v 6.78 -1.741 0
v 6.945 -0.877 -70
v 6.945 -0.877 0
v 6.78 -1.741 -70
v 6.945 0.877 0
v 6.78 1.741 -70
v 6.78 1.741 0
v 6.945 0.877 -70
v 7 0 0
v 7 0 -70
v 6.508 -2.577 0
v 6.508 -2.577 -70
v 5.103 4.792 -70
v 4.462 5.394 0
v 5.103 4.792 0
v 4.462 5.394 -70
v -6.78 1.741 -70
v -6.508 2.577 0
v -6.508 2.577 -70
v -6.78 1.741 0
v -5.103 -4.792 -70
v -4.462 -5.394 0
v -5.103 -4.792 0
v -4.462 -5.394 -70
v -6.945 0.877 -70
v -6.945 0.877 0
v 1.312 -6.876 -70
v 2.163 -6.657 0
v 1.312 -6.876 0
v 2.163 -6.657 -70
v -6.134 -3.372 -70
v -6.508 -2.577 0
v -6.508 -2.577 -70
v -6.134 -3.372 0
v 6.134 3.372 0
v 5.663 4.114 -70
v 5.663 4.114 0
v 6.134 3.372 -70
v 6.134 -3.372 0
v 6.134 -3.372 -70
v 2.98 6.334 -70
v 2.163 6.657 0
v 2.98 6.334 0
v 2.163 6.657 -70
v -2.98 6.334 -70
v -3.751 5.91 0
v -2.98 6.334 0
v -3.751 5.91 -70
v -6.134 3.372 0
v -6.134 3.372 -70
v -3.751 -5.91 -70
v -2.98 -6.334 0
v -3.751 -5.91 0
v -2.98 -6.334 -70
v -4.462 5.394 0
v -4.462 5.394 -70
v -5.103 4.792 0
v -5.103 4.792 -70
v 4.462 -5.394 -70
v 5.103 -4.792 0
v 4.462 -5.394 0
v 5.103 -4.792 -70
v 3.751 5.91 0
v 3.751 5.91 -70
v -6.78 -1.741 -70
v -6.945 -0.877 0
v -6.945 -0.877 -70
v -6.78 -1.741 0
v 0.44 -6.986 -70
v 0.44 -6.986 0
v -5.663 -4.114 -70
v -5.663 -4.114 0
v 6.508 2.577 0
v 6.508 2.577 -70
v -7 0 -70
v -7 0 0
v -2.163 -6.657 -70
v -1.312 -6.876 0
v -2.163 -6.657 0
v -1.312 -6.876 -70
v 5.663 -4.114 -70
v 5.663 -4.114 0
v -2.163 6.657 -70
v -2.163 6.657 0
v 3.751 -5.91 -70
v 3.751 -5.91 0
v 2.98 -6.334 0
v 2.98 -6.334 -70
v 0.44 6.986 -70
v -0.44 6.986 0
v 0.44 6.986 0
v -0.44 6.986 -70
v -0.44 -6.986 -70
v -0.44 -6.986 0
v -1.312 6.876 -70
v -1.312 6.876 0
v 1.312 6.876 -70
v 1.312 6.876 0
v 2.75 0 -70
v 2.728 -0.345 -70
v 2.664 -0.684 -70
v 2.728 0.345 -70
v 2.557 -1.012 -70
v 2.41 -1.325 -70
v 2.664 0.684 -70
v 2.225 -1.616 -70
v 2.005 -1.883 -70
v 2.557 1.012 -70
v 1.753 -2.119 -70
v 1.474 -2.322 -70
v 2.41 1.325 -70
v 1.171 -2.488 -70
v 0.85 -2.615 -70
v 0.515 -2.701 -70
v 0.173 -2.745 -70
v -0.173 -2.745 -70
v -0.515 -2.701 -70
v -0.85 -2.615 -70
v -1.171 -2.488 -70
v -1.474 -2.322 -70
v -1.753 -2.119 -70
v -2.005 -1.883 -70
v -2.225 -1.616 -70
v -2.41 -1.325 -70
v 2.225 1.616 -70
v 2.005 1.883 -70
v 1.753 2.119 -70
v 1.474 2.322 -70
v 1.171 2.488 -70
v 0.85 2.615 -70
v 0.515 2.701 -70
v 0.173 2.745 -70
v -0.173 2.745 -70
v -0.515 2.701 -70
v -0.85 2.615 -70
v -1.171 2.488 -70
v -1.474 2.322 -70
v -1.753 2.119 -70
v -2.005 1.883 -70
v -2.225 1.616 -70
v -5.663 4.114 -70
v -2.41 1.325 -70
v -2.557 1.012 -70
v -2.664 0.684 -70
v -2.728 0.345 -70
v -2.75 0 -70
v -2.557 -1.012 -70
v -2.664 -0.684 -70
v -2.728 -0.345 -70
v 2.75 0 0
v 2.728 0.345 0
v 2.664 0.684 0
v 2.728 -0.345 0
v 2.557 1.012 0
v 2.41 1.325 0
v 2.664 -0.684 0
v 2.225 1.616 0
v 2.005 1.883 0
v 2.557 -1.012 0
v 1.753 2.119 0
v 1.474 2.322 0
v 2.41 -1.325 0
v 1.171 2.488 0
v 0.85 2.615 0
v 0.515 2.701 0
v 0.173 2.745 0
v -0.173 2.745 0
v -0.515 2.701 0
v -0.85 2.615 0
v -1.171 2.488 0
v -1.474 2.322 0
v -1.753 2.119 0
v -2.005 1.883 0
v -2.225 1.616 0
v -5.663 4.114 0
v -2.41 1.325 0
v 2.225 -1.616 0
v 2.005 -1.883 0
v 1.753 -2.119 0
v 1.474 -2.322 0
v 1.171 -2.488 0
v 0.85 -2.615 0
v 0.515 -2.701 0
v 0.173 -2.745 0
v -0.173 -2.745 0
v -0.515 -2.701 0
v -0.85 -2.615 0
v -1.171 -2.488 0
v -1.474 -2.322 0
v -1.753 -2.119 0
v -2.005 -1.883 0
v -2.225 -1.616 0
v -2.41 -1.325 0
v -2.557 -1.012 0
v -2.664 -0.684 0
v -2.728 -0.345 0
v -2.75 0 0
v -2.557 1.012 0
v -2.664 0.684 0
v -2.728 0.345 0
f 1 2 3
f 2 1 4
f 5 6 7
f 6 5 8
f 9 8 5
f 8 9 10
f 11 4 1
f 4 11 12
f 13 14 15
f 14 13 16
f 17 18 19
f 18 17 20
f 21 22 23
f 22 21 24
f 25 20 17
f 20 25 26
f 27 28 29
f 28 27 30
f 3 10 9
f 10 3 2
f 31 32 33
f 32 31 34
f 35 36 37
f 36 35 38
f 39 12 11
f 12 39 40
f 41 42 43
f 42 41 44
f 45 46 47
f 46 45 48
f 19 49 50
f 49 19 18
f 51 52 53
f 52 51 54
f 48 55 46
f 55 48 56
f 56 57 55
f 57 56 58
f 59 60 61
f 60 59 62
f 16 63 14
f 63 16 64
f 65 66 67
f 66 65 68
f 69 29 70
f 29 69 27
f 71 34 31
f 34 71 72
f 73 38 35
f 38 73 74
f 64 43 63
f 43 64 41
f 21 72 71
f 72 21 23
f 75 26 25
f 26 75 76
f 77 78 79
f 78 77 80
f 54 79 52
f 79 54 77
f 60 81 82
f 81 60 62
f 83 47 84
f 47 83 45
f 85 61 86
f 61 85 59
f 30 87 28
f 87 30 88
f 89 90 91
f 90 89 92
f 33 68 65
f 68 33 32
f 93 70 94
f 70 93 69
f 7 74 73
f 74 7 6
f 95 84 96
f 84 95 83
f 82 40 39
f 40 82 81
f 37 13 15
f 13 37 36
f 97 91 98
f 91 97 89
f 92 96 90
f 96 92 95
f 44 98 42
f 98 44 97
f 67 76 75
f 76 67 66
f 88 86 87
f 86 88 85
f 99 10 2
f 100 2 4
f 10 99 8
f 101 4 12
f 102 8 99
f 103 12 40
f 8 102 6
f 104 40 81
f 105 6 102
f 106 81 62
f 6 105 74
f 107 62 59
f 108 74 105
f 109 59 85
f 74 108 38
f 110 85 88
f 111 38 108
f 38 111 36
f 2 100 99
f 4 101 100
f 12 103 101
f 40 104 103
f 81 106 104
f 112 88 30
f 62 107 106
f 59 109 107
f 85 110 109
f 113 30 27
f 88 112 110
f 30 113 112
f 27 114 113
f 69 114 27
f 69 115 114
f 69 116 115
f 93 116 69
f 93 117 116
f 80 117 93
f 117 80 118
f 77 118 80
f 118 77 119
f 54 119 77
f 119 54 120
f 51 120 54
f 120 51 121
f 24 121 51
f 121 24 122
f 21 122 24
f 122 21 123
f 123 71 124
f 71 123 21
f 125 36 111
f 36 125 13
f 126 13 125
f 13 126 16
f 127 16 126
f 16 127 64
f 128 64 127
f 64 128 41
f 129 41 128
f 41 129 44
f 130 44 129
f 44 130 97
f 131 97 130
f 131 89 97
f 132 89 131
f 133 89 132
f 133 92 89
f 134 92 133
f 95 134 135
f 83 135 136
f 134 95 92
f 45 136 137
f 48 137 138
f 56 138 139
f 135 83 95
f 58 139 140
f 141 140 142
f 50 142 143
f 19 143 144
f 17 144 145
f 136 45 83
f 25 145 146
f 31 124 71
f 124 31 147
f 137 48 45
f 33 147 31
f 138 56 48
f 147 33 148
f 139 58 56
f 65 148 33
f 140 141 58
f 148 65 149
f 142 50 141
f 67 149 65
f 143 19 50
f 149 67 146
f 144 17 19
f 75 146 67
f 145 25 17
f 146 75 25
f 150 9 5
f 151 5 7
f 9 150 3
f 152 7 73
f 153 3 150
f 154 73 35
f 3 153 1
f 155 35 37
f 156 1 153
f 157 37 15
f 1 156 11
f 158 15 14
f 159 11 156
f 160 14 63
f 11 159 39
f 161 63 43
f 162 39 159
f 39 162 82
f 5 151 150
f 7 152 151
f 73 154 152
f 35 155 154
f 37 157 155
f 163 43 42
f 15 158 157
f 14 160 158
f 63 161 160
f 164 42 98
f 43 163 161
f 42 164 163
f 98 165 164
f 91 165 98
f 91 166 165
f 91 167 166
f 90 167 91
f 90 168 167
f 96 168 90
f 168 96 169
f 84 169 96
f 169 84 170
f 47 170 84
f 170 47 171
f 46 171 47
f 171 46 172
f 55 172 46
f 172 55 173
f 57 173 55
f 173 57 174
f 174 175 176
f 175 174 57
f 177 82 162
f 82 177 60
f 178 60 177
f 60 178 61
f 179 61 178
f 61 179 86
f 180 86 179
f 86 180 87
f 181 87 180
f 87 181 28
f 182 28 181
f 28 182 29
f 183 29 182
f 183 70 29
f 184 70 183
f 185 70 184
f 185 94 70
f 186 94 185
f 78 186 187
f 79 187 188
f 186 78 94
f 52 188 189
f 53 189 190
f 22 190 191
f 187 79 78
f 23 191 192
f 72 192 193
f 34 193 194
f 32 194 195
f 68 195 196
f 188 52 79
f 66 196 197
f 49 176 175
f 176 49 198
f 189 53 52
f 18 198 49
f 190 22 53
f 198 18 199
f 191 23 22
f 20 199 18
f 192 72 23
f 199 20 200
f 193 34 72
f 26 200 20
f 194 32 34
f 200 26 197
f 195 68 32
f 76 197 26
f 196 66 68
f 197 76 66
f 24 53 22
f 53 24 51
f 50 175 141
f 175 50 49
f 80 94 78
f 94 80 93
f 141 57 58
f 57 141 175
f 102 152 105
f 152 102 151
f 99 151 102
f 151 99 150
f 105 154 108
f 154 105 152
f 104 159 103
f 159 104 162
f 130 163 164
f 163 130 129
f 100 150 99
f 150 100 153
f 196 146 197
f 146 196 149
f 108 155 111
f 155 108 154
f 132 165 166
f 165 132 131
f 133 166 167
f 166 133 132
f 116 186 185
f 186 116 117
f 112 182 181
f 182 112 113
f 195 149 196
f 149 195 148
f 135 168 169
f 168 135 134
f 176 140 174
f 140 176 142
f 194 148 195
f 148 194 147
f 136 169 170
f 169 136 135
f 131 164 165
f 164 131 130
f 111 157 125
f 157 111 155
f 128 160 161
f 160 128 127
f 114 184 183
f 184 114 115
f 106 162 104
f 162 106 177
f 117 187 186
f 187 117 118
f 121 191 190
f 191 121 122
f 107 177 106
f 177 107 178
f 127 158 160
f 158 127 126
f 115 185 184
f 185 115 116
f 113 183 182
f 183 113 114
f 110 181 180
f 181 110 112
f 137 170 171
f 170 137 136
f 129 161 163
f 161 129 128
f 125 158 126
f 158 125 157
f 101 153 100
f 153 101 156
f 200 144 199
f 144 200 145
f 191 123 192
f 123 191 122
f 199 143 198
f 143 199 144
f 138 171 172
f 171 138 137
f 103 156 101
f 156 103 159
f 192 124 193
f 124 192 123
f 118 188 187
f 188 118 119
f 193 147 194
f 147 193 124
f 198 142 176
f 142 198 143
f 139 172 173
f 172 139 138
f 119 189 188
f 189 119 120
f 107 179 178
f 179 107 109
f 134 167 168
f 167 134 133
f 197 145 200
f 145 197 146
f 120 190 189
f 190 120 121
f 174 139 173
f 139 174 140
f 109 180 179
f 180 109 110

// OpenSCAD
$fn = 50;


difference() {
	union() {
		translate(v = [0, 0, -70.0000000000]) {
			cylinder(h = 70, r = 7.0000000000);
		}
		cylinder(h = 0, r = 16.0000000000);
	}
	union() {
		#translate(v = [0, 0, -70]) {
			cylinder(h = 70, r = 2.7500000000);
		}
	}
}
